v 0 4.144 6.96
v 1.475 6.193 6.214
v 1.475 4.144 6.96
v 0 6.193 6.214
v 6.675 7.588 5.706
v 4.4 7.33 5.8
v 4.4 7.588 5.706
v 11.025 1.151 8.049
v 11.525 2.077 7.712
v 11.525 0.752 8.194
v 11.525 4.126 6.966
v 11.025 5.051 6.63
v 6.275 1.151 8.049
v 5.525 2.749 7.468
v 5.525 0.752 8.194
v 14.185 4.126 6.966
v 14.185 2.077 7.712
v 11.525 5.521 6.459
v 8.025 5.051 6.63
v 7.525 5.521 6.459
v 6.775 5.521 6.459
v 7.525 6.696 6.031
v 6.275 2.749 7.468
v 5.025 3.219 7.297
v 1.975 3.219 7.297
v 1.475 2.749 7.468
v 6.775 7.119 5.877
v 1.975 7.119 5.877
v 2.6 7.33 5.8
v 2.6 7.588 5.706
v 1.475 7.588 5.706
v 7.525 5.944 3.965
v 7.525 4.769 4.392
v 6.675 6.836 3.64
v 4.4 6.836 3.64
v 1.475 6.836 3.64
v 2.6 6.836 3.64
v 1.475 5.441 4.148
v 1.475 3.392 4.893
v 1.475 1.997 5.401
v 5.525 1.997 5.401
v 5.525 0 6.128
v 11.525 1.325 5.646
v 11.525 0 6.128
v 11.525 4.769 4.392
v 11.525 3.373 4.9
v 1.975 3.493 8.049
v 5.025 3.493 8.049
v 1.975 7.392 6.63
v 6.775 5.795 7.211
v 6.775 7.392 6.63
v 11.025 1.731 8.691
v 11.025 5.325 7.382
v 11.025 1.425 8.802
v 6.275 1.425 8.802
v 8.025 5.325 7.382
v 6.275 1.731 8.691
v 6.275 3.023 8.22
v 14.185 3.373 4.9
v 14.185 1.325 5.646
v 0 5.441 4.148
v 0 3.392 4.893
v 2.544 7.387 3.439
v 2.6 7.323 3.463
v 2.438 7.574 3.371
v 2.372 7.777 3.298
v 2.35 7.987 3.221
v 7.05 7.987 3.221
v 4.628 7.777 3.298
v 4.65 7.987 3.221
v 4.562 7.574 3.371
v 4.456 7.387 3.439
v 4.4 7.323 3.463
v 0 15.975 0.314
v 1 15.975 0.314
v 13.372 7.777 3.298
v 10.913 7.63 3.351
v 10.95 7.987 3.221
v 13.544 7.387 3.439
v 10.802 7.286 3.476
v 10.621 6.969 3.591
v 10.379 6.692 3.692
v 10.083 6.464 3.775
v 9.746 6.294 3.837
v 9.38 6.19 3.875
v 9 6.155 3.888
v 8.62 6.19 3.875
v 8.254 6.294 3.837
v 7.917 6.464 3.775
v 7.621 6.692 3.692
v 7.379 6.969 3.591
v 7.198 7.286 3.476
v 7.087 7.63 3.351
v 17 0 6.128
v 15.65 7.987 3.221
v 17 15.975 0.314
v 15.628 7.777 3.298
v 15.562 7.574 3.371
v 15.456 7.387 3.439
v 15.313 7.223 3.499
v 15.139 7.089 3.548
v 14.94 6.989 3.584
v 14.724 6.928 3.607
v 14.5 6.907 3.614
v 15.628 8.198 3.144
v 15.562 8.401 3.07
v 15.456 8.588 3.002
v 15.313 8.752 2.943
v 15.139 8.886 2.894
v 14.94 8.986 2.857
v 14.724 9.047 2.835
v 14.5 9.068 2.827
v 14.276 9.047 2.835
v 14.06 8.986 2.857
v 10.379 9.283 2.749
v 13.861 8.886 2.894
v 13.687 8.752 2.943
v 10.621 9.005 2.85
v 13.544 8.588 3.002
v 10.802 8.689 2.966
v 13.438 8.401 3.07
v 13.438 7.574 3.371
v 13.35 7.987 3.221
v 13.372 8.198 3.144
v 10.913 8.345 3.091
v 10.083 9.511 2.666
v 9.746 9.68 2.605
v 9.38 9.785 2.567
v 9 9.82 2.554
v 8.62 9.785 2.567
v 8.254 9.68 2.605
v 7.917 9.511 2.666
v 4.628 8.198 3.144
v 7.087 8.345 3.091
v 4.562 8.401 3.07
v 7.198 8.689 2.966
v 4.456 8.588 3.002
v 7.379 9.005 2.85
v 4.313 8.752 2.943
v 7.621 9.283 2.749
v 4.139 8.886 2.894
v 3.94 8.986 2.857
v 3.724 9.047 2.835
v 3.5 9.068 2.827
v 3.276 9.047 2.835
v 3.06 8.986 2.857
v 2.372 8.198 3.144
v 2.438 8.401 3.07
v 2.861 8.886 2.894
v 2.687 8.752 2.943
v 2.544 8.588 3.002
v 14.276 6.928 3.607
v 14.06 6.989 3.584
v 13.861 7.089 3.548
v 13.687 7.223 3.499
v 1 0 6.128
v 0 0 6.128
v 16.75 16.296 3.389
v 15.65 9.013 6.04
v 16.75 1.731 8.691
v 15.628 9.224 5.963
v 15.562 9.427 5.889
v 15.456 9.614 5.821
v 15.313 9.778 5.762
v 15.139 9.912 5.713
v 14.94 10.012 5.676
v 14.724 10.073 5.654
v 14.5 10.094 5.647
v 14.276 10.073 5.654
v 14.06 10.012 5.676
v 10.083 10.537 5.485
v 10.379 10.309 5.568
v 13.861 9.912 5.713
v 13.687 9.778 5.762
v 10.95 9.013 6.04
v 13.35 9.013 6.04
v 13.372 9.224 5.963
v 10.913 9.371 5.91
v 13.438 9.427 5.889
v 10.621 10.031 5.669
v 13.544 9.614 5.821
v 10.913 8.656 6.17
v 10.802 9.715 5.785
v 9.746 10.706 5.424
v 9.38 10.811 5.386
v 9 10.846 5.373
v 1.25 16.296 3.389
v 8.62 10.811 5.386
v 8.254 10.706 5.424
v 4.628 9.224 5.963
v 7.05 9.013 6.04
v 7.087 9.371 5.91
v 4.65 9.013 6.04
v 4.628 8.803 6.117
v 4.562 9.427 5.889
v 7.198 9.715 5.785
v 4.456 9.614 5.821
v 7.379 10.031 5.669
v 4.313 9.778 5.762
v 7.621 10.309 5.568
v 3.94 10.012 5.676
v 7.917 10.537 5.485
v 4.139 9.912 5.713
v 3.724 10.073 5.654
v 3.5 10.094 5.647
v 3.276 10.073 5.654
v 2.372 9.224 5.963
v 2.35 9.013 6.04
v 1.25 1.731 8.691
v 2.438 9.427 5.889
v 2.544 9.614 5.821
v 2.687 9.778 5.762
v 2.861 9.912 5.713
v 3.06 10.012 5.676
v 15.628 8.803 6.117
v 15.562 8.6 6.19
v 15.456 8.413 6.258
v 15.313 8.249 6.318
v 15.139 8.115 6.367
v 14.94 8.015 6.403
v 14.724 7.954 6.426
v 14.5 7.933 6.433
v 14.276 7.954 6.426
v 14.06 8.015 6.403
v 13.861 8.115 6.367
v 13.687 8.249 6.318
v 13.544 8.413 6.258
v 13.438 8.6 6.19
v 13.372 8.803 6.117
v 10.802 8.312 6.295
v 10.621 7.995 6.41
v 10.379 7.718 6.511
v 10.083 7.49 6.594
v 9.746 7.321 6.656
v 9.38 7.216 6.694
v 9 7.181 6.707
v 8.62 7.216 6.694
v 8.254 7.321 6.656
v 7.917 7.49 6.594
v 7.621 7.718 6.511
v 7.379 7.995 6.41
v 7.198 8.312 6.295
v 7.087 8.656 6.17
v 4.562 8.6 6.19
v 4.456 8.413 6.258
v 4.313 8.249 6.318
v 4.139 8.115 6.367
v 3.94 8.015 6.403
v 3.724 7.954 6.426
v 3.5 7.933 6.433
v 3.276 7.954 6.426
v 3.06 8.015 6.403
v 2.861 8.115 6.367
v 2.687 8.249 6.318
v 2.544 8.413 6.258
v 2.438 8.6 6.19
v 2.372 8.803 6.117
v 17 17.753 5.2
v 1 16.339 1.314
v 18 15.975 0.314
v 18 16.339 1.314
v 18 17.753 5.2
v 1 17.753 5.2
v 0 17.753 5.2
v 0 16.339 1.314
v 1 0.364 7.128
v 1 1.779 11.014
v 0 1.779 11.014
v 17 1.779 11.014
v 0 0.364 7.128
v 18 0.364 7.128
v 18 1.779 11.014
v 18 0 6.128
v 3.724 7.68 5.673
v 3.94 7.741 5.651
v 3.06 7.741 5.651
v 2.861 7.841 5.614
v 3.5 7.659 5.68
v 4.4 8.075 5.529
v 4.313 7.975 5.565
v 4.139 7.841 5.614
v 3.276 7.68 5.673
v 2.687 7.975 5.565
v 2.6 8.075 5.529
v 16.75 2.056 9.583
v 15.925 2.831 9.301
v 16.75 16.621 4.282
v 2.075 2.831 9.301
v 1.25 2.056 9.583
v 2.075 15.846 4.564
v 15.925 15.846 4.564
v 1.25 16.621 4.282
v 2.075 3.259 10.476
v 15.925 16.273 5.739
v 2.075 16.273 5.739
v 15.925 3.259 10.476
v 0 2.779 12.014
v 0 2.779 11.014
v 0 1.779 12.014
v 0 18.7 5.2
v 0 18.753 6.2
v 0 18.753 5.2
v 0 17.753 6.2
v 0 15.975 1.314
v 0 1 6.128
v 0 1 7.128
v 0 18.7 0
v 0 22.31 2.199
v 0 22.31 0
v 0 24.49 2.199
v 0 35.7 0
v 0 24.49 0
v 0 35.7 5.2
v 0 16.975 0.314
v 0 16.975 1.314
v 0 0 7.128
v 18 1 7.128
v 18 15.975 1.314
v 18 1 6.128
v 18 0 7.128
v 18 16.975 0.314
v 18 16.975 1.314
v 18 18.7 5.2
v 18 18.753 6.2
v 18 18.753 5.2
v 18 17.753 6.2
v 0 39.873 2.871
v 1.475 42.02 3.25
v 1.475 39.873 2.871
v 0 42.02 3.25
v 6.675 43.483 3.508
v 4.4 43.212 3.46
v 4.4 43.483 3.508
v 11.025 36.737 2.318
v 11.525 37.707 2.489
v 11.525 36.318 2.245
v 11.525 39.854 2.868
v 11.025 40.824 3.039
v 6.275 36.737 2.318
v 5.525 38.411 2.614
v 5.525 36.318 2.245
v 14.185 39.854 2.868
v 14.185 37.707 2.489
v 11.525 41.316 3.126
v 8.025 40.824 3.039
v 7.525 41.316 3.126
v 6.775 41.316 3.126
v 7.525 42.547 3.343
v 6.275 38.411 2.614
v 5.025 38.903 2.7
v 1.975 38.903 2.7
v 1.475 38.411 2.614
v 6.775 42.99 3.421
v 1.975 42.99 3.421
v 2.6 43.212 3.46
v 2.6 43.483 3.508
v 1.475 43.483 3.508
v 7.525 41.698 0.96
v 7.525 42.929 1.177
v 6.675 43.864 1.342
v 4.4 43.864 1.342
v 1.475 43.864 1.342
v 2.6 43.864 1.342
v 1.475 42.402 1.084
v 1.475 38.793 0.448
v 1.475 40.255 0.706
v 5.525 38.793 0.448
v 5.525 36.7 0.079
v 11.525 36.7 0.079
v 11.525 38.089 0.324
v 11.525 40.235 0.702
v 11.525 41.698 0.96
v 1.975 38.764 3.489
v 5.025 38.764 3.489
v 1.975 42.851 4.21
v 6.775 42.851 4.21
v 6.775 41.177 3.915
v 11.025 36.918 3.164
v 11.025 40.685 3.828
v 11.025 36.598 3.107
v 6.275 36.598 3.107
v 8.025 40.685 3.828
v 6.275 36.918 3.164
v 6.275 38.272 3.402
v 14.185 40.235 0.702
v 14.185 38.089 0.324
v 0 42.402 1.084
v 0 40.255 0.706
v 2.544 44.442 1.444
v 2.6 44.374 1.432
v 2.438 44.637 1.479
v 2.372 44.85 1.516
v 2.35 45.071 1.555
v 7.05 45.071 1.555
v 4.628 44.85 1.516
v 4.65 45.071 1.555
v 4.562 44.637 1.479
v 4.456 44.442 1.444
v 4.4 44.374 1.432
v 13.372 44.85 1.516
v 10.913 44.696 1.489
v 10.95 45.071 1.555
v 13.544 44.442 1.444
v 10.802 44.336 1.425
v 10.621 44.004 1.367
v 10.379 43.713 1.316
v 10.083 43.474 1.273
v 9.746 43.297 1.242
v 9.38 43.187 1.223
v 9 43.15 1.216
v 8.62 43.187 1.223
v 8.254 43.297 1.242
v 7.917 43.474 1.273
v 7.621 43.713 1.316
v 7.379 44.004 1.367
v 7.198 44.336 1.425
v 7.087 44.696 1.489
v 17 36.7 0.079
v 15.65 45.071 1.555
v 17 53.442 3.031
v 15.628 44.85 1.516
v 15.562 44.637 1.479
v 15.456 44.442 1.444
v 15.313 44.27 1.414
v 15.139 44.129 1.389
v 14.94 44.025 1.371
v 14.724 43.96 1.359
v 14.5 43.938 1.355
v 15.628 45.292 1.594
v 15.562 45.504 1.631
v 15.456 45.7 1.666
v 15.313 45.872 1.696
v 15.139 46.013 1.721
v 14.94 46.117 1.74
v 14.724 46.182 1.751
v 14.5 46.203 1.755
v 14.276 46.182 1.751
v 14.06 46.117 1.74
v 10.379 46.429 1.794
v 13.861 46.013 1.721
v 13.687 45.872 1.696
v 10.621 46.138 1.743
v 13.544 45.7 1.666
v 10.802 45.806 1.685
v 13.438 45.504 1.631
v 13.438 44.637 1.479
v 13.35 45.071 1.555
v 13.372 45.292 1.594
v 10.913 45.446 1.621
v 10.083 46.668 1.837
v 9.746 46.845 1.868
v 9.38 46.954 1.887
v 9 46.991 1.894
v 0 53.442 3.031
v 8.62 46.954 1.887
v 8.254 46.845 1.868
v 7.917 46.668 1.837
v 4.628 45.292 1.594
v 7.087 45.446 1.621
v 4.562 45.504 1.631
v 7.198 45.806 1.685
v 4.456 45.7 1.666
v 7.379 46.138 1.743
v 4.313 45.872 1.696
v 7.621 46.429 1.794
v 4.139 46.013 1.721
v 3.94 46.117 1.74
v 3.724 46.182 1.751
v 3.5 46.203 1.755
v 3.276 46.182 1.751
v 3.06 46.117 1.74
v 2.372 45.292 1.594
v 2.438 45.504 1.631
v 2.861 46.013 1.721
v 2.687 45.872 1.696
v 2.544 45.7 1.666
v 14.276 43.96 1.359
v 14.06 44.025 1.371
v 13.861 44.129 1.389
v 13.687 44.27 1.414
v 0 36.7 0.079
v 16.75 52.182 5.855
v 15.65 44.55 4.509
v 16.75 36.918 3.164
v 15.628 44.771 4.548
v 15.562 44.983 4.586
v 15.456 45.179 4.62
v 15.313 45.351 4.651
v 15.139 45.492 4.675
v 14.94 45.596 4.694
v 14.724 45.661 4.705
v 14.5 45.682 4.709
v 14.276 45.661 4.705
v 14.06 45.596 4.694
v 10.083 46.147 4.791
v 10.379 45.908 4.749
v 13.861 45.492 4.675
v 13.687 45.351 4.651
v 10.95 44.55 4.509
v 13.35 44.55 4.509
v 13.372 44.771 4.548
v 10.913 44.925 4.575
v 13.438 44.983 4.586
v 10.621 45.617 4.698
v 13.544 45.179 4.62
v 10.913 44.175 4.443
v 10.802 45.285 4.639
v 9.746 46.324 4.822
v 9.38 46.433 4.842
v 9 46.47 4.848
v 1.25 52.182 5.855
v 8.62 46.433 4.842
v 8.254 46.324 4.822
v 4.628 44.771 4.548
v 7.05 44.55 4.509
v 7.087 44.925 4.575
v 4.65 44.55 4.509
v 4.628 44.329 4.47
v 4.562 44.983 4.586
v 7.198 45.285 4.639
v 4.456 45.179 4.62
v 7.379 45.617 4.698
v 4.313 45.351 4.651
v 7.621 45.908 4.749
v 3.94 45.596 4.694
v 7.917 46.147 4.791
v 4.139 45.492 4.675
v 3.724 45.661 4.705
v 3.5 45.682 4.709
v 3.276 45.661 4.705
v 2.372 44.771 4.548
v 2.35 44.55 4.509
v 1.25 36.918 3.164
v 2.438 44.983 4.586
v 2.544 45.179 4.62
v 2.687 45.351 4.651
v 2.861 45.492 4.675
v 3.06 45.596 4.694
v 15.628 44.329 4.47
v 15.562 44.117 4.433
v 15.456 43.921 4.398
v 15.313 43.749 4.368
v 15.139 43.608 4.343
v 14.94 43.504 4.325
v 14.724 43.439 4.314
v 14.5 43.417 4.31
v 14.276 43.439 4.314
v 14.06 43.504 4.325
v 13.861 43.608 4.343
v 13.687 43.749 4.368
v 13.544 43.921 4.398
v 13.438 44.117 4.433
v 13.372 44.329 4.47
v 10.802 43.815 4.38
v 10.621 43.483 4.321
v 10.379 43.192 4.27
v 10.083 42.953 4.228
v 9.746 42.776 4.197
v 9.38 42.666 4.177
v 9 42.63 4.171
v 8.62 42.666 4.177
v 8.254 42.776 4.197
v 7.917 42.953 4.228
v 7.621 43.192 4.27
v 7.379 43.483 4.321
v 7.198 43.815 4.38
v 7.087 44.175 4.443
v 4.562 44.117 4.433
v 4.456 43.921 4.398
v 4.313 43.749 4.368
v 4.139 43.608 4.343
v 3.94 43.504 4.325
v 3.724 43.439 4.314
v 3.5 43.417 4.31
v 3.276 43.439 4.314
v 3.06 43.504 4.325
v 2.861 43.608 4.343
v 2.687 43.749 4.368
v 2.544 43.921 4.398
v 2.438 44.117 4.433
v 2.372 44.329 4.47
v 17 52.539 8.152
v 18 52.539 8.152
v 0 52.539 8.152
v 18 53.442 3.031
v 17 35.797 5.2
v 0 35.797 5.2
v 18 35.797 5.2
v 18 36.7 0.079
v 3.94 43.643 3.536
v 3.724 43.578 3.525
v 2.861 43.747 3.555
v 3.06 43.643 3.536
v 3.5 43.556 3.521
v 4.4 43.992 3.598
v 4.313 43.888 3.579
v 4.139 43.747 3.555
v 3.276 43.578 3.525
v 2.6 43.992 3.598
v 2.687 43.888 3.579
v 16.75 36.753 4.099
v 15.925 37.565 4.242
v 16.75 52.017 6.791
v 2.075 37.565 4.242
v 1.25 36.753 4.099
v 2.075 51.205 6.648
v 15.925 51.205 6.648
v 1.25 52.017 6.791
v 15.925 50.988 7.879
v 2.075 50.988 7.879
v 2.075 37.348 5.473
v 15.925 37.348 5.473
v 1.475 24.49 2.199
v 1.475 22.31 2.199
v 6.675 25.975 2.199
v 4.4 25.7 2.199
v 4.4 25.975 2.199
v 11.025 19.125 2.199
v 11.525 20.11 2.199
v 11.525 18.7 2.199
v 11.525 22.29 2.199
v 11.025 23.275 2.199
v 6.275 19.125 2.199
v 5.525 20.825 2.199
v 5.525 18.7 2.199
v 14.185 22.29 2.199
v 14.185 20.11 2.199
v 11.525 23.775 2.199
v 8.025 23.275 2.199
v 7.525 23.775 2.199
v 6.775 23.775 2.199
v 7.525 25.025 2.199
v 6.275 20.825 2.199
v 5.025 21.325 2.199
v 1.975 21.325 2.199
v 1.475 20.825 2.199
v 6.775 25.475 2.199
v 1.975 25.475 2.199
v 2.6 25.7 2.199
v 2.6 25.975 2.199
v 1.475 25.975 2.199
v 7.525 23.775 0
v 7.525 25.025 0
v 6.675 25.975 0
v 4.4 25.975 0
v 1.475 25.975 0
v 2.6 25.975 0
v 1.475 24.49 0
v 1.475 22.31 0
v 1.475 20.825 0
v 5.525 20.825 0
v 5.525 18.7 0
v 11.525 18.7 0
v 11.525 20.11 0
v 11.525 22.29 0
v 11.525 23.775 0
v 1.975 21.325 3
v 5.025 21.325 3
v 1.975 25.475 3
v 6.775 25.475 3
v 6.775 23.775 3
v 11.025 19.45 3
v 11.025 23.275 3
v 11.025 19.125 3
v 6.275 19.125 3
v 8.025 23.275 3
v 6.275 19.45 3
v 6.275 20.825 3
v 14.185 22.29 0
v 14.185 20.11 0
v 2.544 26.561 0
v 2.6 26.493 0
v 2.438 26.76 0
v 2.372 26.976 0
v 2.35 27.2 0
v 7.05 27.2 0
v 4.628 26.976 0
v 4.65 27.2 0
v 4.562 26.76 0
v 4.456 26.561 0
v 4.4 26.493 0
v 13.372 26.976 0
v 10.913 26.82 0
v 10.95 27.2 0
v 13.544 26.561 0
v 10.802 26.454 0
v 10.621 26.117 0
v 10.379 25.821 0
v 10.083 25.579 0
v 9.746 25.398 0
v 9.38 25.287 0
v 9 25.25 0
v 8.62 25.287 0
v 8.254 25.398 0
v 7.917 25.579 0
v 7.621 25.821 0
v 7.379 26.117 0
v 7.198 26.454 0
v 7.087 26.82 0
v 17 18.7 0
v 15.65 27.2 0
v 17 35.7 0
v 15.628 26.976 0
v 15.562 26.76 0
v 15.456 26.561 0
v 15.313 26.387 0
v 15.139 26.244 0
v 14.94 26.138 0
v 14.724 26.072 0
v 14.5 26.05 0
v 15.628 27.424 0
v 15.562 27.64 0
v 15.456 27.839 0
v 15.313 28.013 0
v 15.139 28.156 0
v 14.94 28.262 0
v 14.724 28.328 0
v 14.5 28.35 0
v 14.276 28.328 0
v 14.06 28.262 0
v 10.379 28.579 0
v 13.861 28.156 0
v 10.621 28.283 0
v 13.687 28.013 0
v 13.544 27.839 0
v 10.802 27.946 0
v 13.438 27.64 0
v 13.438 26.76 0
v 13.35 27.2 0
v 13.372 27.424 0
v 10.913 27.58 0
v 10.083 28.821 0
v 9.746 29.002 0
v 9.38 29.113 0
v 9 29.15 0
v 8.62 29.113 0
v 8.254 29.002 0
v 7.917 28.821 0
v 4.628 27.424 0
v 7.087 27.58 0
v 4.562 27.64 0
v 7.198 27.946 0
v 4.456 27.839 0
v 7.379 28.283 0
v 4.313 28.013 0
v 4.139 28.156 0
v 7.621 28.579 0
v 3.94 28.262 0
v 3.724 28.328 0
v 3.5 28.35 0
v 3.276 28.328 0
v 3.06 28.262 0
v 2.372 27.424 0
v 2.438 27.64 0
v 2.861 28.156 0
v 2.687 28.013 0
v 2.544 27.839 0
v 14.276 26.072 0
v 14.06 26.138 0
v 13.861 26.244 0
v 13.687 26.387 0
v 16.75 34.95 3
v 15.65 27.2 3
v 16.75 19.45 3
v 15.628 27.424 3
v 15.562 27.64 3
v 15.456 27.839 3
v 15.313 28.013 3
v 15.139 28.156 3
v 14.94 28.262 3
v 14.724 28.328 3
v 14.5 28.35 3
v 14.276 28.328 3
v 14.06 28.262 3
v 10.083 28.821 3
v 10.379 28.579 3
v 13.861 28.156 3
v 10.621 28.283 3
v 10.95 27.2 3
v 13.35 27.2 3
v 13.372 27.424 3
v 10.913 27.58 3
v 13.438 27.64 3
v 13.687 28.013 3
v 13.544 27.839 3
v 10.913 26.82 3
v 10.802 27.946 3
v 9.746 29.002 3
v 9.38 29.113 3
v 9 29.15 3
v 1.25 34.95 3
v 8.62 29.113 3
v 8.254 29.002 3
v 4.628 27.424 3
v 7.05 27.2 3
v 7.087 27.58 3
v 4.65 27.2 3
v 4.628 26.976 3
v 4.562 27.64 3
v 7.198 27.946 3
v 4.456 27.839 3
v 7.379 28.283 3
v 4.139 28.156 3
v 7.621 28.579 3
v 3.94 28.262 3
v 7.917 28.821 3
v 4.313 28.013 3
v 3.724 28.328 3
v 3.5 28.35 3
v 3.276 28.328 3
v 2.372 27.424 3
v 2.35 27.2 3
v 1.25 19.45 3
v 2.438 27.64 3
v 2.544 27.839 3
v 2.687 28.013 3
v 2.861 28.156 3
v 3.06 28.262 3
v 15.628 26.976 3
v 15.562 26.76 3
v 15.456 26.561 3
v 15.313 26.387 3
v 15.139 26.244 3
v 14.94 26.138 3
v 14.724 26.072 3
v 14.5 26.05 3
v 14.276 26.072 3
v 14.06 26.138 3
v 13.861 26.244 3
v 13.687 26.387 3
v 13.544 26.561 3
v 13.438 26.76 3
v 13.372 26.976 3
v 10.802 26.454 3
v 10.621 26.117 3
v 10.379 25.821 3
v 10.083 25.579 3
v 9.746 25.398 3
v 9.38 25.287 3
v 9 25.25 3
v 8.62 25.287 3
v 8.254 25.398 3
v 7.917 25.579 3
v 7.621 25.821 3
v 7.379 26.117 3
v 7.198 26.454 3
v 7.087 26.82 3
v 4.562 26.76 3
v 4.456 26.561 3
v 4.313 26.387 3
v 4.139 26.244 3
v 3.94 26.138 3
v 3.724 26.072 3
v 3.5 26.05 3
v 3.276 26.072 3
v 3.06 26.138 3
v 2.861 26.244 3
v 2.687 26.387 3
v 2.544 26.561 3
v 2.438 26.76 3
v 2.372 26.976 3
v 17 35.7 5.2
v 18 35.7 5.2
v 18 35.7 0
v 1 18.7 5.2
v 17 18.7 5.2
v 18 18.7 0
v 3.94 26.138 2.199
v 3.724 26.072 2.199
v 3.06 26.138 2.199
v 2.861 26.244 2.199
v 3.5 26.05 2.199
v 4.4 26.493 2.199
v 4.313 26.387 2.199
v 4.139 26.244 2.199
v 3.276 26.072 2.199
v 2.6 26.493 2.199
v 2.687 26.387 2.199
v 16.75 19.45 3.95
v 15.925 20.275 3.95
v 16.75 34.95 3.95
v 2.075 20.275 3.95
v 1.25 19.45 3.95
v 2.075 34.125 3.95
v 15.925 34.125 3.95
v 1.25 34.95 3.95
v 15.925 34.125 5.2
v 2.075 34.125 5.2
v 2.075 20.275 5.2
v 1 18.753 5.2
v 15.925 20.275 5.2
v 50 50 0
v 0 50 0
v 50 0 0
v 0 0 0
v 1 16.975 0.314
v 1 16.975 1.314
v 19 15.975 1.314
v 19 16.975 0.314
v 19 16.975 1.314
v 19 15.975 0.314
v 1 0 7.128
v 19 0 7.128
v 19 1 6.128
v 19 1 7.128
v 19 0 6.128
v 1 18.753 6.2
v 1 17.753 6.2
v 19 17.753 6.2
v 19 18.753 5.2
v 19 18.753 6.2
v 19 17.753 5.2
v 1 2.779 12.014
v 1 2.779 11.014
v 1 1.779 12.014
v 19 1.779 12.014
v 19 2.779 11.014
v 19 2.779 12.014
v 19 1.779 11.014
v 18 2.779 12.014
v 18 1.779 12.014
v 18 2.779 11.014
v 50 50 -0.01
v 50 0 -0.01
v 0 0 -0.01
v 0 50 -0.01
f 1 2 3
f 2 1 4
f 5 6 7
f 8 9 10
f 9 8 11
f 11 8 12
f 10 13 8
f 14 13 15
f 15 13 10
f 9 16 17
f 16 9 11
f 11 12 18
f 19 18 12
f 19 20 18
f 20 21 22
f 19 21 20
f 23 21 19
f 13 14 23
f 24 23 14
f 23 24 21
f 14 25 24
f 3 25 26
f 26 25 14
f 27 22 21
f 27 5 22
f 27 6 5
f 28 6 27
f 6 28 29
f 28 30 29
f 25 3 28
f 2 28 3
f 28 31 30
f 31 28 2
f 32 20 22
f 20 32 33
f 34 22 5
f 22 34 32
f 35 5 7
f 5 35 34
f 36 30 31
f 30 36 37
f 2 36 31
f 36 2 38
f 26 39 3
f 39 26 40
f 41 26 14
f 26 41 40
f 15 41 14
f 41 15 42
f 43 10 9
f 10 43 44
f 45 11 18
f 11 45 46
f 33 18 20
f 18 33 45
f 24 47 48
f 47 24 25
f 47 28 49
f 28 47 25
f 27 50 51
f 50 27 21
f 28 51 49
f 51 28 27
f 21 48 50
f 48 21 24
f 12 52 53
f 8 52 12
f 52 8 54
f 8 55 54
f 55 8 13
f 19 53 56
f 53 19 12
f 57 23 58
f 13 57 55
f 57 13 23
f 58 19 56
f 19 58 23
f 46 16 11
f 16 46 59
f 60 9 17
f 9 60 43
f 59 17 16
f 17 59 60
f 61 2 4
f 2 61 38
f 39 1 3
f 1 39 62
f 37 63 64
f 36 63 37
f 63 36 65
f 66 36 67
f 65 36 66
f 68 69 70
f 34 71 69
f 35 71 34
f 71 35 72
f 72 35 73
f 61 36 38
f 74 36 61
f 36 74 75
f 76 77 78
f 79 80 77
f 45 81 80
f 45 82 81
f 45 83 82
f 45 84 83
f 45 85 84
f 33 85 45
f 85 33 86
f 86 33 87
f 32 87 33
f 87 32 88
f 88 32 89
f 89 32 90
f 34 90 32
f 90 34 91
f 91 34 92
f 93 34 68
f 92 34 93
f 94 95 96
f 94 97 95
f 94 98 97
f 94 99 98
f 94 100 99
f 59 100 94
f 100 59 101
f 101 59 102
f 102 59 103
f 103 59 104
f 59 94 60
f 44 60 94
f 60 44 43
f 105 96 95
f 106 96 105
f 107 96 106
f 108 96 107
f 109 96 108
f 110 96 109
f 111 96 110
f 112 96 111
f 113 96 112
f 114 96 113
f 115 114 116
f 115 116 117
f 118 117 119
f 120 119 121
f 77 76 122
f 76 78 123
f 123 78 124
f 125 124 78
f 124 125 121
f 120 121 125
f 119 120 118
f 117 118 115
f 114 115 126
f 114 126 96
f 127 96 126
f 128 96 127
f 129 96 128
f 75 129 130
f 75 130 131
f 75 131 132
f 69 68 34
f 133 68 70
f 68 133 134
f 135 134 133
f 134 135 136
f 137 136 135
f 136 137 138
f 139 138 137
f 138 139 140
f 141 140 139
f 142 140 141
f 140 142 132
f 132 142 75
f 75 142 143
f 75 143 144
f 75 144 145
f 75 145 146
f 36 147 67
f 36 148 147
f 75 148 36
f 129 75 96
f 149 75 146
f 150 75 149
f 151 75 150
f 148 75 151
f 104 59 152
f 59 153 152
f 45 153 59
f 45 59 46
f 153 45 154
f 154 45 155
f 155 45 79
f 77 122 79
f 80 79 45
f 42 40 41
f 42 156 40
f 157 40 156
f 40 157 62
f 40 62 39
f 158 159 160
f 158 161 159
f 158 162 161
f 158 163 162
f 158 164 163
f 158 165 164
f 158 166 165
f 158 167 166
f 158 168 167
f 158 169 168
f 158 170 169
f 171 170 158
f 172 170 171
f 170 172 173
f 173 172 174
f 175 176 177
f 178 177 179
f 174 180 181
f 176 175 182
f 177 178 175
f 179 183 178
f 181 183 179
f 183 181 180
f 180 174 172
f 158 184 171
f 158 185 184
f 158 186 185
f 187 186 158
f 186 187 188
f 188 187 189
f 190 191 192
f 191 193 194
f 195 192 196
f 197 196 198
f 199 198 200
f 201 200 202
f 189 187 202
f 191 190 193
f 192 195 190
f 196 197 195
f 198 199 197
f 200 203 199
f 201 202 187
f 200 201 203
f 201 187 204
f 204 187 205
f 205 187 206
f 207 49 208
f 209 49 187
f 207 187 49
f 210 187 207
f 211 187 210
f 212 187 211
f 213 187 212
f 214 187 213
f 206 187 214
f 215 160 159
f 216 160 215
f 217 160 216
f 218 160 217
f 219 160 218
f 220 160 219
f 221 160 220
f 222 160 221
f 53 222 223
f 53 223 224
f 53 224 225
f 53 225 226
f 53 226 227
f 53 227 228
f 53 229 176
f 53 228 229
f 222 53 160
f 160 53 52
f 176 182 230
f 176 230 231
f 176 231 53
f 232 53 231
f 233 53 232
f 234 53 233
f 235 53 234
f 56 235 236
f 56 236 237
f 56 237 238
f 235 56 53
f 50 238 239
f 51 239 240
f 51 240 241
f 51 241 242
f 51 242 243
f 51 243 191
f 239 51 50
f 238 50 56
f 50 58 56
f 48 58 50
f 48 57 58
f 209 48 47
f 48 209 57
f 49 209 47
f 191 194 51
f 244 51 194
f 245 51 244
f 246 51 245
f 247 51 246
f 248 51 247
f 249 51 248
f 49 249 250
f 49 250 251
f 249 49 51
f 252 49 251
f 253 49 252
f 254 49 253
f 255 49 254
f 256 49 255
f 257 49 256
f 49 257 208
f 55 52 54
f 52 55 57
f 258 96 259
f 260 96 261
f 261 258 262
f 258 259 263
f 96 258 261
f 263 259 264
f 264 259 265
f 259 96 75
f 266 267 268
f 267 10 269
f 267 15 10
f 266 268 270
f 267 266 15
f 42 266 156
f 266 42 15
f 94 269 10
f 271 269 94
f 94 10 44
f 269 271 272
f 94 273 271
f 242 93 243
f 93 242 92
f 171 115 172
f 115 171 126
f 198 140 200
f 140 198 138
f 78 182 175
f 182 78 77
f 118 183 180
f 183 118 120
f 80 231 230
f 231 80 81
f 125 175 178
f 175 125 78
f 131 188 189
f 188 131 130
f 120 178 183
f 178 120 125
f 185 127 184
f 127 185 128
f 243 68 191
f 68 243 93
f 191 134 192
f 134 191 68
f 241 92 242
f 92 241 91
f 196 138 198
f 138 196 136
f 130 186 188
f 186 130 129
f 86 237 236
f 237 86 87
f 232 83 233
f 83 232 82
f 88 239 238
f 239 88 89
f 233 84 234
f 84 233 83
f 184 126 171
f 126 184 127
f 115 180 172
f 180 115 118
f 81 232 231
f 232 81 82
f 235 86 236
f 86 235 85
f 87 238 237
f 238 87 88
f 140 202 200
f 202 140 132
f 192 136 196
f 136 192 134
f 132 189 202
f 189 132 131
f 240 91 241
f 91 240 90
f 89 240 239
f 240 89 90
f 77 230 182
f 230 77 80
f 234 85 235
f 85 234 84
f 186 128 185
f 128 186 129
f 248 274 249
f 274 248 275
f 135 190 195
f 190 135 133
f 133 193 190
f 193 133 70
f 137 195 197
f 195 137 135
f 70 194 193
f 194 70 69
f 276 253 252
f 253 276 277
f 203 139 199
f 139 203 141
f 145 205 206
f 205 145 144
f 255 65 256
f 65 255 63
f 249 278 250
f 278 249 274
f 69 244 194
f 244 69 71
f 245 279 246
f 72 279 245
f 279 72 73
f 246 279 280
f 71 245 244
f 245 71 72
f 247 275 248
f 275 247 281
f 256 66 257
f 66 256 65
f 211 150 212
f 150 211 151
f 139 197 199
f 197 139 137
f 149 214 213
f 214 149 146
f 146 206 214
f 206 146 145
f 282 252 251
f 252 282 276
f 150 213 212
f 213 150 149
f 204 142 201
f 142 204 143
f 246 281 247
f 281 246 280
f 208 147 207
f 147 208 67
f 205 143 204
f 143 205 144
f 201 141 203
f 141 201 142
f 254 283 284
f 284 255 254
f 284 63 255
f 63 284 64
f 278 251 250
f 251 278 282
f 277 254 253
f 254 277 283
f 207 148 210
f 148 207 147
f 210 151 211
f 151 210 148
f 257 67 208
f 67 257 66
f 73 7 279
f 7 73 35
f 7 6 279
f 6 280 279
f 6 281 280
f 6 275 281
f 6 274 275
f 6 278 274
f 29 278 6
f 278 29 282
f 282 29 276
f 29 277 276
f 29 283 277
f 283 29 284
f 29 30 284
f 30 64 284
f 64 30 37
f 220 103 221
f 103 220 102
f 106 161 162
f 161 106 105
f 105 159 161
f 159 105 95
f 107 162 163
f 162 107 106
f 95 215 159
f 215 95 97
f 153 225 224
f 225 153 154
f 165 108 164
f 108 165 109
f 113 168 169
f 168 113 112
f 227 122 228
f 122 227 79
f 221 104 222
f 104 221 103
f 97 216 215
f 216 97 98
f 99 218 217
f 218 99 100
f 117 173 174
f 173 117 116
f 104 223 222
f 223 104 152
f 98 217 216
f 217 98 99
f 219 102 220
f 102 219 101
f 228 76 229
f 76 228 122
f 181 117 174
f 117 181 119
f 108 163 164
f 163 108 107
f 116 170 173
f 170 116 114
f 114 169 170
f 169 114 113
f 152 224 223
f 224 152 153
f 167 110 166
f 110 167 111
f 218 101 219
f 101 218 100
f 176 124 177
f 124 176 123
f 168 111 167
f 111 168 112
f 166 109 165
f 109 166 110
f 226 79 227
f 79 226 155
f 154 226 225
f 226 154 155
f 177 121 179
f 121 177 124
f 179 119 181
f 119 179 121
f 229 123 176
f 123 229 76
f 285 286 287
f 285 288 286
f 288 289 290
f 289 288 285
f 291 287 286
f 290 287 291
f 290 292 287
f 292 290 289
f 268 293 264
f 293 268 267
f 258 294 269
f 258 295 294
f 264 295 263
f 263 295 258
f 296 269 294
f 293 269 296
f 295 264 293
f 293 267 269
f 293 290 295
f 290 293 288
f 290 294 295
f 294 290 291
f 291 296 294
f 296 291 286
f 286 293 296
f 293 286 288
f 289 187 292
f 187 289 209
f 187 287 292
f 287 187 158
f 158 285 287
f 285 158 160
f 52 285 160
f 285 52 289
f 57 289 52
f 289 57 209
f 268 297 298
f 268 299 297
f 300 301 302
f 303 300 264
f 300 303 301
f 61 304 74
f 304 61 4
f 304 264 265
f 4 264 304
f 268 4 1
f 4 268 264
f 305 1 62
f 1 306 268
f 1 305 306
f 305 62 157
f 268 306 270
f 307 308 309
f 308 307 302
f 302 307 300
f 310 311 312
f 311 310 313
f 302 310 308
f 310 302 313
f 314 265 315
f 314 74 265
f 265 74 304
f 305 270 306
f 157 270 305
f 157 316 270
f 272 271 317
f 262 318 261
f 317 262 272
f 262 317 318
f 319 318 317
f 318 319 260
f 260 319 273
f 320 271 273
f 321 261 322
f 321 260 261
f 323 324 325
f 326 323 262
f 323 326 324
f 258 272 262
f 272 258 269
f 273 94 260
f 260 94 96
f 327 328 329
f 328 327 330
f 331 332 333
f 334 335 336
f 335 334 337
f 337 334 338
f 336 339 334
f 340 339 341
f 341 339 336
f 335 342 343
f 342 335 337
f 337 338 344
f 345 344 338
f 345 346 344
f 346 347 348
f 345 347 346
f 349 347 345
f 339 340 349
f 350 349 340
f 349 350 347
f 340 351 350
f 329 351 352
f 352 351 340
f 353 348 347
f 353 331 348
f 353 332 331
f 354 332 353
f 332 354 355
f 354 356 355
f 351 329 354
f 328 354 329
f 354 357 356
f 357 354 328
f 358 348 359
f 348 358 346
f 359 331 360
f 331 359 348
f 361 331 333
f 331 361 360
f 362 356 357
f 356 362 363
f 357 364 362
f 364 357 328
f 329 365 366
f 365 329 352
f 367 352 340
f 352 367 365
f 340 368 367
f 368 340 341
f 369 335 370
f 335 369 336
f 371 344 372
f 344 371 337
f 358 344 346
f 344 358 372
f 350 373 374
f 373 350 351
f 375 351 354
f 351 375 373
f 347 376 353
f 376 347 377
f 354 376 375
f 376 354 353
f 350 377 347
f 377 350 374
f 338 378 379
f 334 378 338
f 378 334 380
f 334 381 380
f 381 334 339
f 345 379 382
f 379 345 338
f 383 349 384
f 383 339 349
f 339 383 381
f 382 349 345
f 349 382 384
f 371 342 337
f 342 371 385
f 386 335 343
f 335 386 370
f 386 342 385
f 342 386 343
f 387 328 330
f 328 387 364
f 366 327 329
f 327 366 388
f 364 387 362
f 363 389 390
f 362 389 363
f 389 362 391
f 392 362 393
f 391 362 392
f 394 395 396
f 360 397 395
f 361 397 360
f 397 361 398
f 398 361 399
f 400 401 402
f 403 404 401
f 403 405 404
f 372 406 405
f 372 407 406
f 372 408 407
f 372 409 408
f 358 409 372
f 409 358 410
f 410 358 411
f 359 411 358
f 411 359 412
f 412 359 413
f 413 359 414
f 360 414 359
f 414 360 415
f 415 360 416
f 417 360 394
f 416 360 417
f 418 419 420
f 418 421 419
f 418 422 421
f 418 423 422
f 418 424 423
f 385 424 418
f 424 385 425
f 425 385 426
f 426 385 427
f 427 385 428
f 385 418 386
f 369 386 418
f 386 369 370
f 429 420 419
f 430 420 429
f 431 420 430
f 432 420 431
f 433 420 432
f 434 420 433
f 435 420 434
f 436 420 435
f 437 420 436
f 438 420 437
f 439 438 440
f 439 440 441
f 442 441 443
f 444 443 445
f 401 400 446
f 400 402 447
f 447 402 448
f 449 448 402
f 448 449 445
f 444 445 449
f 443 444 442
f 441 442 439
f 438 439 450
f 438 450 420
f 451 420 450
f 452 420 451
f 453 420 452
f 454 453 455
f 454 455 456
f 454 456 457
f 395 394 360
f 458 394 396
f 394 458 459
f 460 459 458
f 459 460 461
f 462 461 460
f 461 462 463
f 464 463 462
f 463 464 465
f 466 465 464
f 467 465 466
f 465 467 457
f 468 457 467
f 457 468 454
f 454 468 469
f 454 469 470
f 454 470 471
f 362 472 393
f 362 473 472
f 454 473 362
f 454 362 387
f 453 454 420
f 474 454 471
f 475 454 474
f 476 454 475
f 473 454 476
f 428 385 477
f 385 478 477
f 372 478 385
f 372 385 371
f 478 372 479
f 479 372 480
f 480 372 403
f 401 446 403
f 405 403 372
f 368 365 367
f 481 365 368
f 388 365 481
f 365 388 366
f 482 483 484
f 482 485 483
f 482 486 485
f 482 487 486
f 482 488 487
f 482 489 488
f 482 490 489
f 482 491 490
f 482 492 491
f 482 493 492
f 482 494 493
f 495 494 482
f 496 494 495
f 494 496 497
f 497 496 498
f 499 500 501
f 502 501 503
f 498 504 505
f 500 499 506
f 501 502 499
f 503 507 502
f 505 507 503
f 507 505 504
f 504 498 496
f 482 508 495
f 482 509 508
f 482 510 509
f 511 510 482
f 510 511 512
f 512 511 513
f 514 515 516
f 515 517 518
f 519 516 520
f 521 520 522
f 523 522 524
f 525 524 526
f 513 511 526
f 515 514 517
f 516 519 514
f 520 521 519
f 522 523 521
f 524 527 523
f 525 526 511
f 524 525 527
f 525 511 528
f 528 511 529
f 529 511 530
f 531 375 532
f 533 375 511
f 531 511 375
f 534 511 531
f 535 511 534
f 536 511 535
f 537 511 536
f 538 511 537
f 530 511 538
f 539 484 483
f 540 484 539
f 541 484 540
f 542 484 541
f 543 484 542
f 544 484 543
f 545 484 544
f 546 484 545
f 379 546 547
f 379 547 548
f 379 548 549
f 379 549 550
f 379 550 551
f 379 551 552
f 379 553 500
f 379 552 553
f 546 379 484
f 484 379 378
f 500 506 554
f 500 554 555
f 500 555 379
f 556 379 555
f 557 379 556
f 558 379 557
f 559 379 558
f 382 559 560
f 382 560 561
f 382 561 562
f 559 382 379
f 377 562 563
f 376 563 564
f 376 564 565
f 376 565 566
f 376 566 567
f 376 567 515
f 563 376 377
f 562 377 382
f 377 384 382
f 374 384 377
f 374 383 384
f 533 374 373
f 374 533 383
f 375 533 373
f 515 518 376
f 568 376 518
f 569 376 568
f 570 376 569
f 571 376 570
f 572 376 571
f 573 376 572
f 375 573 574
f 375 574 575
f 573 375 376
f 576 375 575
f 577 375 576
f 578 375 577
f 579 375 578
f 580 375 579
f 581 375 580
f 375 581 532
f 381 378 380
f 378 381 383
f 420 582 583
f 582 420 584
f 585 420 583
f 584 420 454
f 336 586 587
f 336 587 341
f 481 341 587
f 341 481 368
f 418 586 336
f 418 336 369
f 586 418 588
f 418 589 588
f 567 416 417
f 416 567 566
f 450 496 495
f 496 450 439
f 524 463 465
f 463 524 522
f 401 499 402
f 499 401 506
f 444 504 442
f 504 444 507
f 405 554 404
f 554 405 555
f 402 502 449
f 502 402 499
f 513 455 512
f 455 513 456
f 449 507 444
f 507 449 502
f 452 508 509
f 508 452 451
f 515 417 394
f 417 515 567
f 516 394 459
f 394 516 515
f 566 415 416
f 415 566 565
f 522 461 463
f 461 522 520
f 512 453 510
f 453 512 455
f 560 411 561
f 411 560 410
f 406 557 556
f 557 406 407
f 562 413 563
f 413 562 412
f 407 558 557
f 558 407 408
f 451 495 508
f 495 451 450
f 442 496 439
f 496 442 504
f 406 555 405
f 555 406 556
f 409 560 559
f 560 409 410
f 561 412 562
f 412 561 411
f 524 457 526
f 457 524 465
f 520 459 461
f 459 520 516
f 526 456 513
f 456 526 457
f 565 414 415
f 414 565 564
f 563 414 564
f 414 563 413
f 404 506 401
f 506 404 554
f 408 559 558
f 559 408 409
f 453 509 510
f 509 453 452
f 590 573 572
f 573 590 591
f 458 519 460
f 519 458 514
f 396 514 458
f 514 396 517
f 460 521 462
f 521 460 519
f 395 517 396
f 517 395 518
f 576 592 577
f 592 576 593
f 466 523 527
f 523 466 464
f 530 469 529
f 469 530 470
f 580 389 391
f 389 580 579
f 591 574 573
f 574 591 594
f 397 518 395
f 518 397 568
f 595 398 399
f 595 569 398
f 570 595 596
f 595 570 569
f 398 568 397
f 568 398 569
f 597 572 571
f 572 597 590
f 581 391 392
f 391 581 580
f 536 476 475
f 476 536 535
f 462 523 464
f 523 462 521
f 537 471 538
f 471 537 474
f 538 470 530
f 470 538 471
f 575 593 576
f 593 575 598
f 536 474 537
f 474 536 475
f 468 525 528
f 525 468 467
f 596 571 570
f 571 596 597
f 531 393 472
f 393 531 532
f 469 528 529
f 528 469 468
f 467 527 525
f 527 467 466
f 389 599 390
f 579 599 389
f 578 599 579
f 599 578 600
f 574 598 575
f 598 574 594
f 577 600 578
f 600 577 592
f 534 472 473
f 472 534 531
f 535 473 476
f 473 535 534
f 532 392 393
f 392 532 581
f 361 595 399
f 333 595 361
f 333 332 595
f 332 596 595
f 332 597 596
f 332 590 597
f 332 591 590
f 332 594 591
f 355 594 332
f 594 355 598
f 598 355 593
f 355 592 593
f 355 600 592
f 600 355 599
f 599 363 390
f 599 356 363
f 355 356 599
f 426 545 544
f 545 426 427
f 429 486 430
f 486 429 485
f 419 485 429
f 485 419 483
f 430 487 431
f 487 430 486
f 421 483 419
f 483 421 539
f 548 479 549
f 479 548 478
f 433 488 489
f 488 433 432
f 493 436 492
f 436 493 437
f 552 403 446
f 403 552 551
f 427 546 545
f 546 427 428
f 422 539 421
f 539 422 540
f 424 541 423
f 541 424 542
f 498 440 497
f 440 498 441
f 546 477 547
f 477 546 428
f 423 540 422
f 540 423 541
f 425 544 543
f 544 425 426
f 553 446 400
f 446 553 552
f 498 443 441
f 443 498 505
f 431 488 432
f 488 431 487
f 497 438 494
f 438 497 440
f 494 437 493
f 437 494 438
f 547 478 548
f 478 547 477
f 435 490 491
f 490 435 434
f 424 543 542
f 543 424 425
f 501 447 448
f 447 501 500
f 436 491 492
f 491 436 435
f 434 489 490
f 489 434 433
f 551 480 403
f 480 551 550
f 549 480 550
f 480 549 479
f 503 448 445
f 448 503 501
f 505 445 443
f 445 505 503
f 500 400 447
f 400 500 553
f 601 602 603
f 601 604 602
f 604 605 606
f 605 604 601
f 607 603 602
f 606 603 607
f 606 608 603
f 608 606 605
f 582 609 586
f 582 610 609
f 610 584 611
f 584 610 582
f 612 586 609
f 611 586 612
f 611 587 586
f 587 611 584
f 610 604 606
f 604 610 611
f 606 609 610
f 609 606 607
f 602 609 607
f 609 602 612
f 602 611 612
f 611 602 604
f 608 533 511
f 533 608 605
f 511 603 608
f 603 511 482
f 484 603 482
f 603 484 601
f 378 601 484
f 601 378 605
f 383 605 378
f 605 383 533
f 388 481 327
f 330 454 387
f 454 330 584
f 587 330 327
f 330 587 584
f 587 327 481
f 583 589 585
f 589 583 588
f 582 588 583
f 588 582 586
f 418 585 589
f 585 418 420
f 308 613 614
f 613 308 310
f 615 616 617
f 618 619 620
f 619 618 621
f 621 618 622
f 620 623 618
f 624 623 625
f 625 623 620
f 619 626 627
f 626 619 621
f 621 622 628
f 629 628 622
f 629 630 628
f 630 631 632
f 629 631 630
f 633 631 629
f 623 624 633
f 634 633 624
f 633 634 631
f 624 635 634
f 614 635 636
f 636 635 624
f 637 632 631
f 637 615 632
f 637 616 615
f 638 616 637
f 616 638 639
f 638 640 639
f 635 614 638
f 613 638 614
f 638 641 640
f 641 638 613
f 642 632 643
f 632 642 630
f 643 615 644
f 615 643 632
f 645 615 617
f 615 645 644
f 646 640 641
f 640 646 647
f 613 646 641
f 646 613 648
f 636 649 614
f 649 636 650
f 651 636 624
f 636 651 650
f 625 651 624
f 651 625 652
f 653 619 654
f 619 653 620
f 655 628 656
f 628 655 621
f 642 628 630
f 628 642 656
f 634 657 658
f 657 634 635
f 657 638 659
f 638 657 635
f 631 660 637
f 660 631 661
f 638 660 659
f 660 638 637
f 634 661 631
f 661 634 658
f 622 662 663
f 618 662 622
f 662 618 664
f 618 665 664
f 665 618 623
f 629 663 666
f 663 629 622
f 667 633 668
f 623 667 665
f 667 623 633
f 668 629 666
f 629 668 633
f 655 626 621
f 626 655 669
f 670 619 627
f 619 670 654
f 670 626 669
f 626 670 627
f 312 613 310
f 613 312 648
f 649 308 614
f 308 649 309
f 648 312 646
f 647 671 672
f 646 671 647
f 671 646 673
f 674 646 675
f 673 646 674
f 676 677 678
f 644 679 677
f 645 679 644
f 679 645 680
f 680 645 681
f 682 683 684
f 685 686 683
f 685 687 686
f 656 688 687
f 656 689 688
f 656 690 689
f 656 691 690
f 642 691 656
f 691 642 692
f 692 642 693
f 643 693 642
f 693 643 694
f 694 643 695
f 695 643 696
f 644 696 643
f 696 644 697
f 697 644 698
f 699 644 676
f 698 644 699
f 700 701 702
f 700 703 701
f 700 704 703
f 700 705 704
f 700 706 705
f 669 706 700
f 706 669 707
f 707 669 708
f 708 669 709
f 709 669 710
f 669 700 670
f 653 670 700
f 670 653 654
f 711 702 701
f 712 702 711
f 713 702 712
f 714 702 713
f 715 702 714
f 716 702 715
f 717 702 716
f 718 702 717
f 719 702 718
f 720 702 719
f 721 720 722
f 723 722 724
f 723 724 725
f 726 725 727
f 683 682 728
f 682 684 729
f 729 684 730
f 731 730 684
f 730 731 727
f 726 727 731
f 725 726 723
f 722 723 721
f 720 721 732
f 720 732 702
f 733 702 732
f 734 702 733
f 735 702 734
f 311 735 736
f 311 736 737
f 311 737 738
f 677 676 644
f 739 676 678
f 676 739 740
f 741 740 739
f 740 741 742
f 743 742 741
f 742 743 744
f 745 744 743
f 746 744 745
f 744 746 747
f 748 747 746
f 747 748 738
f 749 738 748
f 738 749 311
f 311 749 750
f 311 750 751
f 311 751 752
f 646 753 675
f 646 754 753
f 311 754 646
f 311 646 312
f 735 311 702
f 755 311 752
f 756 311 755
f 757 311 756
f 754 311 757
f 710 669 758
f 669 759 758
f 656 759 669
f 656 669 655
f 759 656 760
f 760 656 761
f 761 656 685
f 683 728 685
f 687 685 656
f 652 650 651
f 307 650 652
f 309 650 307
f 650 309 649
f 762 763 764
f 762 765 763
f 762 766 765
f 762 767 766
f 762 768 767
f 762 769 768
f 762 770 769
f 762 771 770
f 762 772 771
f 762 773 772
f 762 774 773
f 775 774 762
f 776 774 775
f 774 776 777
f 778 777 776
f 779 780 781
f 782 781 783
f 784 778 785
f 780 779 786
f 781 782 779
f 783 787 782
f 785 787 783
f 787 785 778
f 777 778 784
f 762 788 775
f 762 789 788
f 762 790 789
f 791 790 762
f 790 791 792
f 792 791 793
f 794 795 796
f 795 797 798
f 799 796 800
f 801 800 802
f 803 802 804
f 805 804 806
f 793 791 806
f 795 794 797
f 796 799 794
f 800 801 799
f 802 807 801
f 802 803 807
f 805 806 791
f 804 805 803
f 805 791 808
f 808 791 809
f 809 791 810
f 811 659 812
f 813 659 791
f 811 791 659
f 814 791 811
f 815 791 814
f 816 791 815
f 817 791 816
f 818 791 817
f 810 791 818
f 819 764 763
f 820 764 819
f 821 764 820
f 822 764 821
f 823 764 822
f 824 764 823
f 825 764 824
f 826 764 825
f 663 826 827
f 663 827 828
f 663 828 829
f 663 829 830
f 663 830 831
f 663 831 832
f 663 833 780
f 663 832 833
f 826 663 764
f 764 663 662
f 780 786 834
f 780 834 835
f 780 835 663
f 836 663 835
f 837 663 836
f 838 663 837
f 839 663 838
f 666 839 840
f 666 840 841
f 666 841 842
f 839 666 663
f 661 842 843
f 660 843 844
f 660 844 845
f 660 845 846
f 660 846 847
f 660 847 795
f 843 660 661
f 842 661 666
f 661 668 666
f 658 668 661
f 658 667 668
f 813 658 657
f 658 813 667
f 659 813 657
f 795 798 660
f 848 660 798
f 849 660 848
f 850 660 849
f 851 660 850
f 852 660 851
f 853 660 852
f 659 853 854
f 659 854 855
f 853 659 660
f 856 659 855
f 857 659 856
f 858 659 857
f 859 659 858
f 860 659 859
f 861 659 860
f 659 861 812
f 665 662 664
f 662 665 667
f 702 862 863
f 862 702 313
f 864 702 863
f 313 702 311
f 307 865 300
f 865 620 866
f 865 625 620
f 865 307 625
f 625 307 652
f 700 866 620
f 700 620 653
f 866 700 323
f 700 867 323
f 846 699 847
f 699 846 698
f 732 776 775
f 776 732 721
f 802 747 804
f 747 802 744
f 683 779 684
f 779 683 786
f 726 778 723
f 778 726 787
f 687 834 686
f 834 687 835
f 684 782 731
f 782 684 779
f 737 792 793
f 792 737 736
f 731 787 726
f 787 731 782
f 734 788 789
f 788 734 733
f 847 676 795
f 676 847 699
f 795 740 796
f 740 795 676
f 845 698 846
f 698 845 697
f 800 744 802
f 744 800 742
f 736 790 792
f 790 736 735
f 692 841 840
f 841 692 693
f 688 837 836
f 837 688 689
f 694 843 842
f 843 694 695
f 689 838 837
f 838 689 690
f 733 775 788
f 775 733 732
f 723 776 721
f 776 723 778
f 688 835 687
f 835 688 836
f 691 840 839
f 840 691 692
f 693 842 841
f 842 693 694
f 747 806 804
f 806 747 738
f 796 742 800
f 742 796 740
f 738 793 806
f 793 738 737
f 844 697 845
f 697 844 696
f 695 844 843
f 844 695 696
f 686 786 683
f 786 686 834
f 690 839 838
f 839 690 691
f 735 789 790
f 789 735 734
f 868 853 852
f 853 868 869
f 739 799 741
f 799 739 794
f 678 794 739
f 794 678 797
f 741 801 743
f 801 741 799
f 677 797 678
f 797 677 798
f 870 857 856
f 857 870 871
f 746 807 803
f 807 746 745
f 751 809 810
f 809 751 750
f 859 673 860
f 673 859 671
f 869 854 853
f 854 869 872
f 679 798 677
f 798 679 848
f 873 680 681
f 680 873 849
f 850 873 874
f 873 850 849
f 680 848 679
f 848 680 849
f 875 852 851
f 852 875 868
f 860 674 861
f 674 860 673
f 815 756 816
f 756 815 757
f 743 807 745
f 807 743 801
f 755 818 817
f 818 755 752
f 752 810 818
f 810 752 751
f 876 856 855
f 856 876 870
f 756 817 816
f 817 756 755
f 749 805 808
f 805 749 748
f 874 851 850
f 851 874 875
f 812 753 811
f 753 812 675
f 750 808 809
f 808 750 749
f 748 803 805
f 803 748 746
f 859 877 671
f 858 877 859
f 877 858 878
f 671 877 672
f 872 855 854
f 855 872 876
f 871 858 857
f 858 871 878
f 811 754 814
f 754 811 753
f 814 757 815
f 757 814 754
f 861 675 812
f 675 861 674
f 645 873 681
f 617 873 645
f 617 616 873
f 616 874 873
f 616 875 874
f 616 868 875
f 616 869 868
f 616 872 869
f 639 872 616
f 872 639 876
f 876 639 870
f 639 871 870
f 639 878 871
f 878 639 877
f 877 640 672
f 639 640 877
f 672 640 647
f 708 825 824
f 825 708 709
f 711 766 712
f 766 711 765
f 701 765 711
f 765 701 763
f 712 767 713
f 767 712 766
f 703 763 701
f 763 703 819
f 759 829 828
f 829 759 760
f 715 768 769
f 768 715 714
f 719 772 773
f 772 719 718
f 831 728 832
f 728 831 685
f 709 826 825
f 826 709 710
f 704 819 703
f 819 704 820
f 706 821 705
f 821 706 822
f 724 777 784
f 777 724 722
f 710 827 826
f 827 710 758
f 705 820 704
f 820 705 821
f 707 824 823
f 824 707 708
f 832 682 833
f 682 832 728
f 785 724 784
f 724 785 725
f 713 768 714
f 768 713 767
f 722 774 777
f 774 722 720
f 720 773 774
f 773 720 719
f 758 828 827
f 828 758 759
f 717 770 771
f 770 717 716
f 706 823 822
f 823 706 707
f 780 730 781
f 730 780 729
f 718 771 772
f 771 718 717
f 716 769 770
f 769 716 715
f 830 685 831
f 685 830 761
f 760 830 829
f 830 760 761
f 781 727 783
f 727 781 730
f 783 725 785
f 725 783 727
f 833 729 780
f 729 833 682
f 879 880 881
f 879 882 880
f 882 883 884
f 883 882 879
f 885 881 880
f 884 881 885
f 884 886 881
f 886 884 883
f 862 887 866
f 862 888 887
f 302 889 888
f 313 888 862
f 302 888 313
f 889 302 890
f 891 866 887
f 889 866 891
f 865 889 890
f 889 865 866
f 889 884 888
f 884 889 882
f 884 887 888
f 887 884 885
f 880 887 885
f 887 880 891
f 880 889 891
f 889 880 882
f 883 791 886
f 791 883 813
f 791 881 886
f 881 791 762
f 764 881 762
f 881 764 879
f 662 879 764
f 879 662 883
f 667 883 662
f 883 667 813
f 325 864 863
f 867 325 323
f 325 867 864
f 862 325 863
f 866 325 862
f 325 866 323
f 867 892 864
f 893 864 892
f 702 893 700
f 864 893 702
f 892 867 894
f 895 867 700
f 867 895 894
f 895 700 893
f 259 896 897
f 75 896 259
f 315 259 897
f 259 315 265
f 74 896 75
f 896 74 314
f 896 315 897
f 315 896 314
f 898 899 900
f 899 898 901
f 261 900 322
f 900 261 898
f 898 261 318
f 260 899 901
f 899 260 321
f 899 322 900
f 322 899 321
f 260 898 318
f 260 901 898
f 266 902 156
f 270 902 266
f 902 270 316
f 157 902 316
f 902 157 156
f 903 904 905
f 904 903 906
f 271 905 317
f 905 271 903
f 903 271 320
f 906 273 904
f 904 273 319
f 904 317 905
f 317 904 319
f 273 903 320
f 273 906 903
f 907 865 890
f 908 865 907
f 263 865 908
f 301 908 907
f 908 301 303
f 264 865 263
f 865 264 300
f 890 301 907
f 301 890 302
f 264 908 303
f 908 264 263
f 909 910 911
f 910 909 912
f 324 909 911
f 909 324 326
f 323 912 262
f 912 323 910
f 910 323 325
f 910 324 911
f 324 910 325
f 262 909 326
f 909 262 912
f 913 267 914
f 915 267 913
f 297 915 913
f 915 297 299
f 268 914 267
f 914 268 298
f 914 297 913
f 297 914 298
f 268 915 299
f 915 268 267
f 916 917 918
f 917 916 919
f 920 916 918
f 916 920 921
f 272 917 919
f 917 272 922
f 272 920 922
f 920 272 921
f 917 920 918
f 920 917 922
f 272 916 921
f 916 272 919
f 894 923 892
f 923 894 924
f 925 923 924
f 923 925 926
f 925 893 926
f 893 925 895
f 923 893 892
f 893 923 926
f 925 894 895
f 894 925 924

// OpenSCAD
$fn = 32; // set the resolution of the model (Low during developmet for fast renders)

// ===================================IMPORTANT_NOTE======================================
// use use instaead of include such that the demo does not show in the file you call it in
// =======================================================================================

// local variables only used for demo of module and functions in this file
local_rotation_x = -20;
local_rotation_z = -0;
local_bottom_row = true;

// Naming explained:
// Slack means how much larger a part of the model is in comparison to the schematics
// so if you leave all slack it will be same dimensions as the schematics but most printers
// will make the holes smaller than the moddel and hence won't work so slack varaibles must
// be tested to ensure good fit before full print
//
// for hotswap width is the short side
// height is the long side with the connectors top and bottom
module key(
    plate_slack = 0.05,         // Slack for the top square hole
    plate_depth_slack = 0.05,   // slack for thickness of ledge for top square
    width_padding = 0.25,       // Slack for widht of hotswap cutout
    height_padding = 0.25,      // Slack for height of hotswap cutout
    exit_padding = 0.5,         // Slack for width of rectangle for hotswap metallic contact pad
    ledge_width = 0.5,          // How big the ledge is around the cutout to hold the hotswap
    center_radius_slack = 0.35, // Slack for center hole (big center pin of switch)
    sides_radius_slack = 0.25,  // Slack for side holes (smaller pins of switch)
    rotation_x =
        local_rotation_x, // rotation of the xy plane so normal 2D rotation around z-axis (e.g, for splay of columns)
    rotation_z =
        local_rotation_z, // rotation of the yz plane so normal 2D rotation around x-axis (e.g, for creating key wells)
)
{

    translate([ 0, 0, compute_translate_z(rotation_x, rotation_z) ])
        // color("pink") // Set to one to make it look like one (uncomment for development of module)
        rotate([ rotation_x, 0, rotation_z ])
            translate([ 0, 0, 0.9 + plate_depth_slack + 3 ]) // move the bottom to z == 0
        union()
    {
        // plate part
        color("red") linear_extrude(1.3 - plate_depth_slack) difference()
        {

            square([ 18, 17 ]);
            translate([ 2.1 + 1 - plate_slack / 2, 1.6 - plate_slack / 2 ]) square([
                13.8 + plate_slack, 13.8 + plate_slack
            ]); // the x axis should mby be 13.6 not sure as the drawing is contradicting
        }

        color("blue") translate([ 0, 0, -0.9 - plate_depth_slack ]) linear_extrude(0.9 + plate_depth_slack) difference()
        {
            square([ 18, 17 ]);
            translate([ 1.25 + 1, 0.75 ]) square([ 15.5, 15.5 ]);
        }

        // Hotswap part
        difference()
        {
            difference()
            {
                translate([ 0, 0, -3 - 0.9 - plate_depth_slack ]) color("green") linear_extrude(3) square([ 18, 17 ]);

                // translate is after roatate so we are moving the rightmost corner of the polygon from the origin (this
                // is withough padding so padding is extra)
                translate([ 11.275 + 1, 0.175, -3.001 - 0.9 - plate_depth_slack ]) rotate(90) union()
                {
                    linear_extrude(2.2, center = false)
                    {
                        polygon(points = [
                            [ 0 - width_padding, 0 - height_padding ], [ 4.65 + width_padding, 0 - height_padding ],
                            [ 4.65 + width_padding, 3.75 ], [ 5.9 + width_padding, 3.75 ],
                            [ 6.85 + width_padding, 4.6 ], [ 6.85 + width_padding, 9.55 + height_padding ],
                            [ 2.2 - width_padding, 9.55 + height_padding ], [ 2.2 - width_padding, 5.75 ],
                            [ 0 - width_padding, 5.75 ]
                        ]);
                    }

                    linear_extrude(4.2, center = false)
                    {
                        polygon(points = [
                            [ 4.65 + width_padding, 3.75 + ledge_width * 1.5 ],
                            [ 6.85 - ledge_width + width_padding, 3.75 + ledge_width * 1.5 ],
                            [ 6.85 - ledge_width + width_padding, 9.55 - ledge_width + height_padding ],
                            [ 2.2 + ledge_width - width_padding, 9.55 - ledge_width + height_padding ],
                            [ 2.2 + ledge_width - width_padding, 5.75 + ledge_width ]

                        ]);
                    }

                    linear_extrude(4.2, center = false)
                    {
                        polygon(points = [
                            [ 0 + ledge_width - width_padding, 0 + ledge_width - height_padding ],
                            [ 4.65 - ledge_width + width_padding, 0 + ledge_width - height_padding ],
                            [ 4.65 - ledge_width + width_padding, 3.75 - ledge_width ],
                            [ 2.2 - width_padding, 5.75 - ledge_width * 1.5 ],
                            [ 0 + ledge_width - width_padding, 5.75 - ledge_width * 1.5 ]

                        ]);
                    }

                    color("orange") translate([ 1.485 - exit_padding / 2, -2.66 - height_padding, 0 ])
                        cube([ 1.68 + exit_padding, 2.67, 2.2 ]);
                    color("pink") translate([ 3.685 - exit_padding / 2, 9.54 + height_padding, 0 ])
                        cube([ 1.68 + exit_padding, 2.67, 2.2 ]);
                }
            }

            // The 3 holes in a line on the midplate

            translate([ 9 + 1, 8.5, -3.001 - 0.9 - plate_depth_slack ]) cylinder(h = 10, r = 1.6 + center_radius_slack);
            color("indigo") translate([ 3.5 + 1, 8.5, -3.001 - 0.9 - plate_depth_slack ])
                cylinder(h = 10, r = 0.9 + sides_radius_slack);

            // A cube to subtract to make the print quality better as the hole is too close to the hotswap part
            color("red") translate([ 3.6, 7, -3.001 - 0.9 - plate_depth_slack ]) cube([ 1.8, 1, 2.2 ]);

            translate([ 14.5 + 1, 8.5, -3.001 - 0.9 - plate_depth_slack ])
                cylinder(h = 10, r = 0.9 + sides_radius_slack);
        }
    }
}

module centered_key(
    plate_slack = 0.05,         // Slack for the top square hole
    plate_depth_slack = 0.05,   // slack for thickness of ledge for top square
    width_padding = 0.25,       // Slack for widht of hotswap cutout
    height_padding = 0.25,      // Slack for height of hotswap cutout
    exit_padding = 0.5,         // Slack for width of rectangle for hotswap metallic contact pad
    ledge_width = 0.5,          // How big the ledge is around the cutout to hold the hotswap
    center_radius_slack = 0.35, // Slack for center hole (big center pin of switch)
    sides_radius_slack = 0.25,  // Slack for side holes (smaller pins of switch)
    rotation_x =
        local_rotation_x, // rotation of the xy plane so normal 2D rotation around z-axis (e.g, for splay of columns)
    rotation_z =
        local_rotation_z, // rotation of the yz plane so normal 2D rotation around x-axis (e.g, for creating key wells)
)
{

    // move the key up along z-axis so the bottom of the key is at z == 0
    // This is the translattion that bottom_row accounts for
    // translate_by = rotation_x < 0 ? vec_rotated_xz(0, 17, 5.2, rotation_x, rotation_z, false): [0, 0, 0];
    // echo("Translate by: ", translate_by);

    translate([ 0, 0, compute_translate_z(rotation_x, rotation_z) ]) rotate([ rotation_x, 0, rotation_z ])
        // color("orange")
        translate([ -1, 0, 0 ]) union()
    {
        difference()
        {
            key(plate_slack, plate_depth_slack, width_padding, height_padding, exit_padding, ledge_width,
                center_radius_slack, sides_radius_slack, 0, 0);

            translate([ -0.1, -0.1, -0.1 ]) cube([ 1.1, 20, 8.2 ]);

            // square([ 18, 17 ]);
        }
        translate([ 18, 0, 0 ]) cube([ 1, 17, 5.2 ]);
    }
}

centered_key();

translate([ 0, 18.7 + 18, 0 ]) centered_key(rotation_x = 10, rotation_z = 0);

translate([ 0, 18.7, 0 ]) centered_key(rotation_x = 0, rotation_z = 0);

// ====================================================================
//                          Helper functions
// ====================================================================

// compute the needed z-axis translation to move the top of the key to 5.2 which is thckness of the key
// the corner that is connected to the flat middle key is the one that decides which we compute by
// so top row computes by bottom top corners and bottom row computes by top top corners
function compute_translate_z(rotation_x, rotation_z) = rotation_x < 0
                                                           ? 5.2 - z_vec_rotated_xz(17, 5.2, rotation_x, rotation_z)
                                                           : // bottom row key
                                                           rotation_x > 0
                                                           ? 5.2 - z_vec_rotated_xz(0, 5.2, rotation_x, rotation_z)
                                                           :  // top row key
                                                           0; // middle key

// compute only the z-axis change for the rotation around x and z axis used in compute_translate_z
// so same as vec_rotated_xz but only for z-axis result is returned
function z_vec_rotated_xz(y, z, rotation_x, rotation_z) = y * sin(rotation_x) + z * cos(rotation_x);

// account_z_translate means that the key has been translated up along z-axis to make the connected corners z-axis = 5.2
// so to get correct point location that translation must be accounted for hence the flag
// need flag as it's used fro computation of compute_translate_z
function vec_rotated_xz(x, y, z, rotation_x, rotation_z) = [
    x * cos(rotation_z) - y * sin(rotation_z) * cos(rotation_x) + z * sin(rotation_z) * sin(rotation_x),
    x *sin(rotation_z) + y *cos(rotation_z) * cos(rotation_x) - z *cos(rotation_z) * sin(rotation_x),
    y *sin(rotation_x) + z *cos(rotation_x) + compute_translate_z(rotation_x, rotation_z)
];

// y*sin(rotation_x) + z*cos(rotation_x) + 5.2 - vec_rotated_xz(0, 17, 5.2, rotation_x, rotation_z, false)[2]
// ====================================================================
//                      Demo of helper functions
// ====================================================================

// top left back corner
color("Indigo") translate(vec_rotated_xz(0, 17, 0, local_rotation_x, local_rotation_z)) cube([ 1, 1, 1 ]);

// top right back corner
color("pink") translate(vec_rotated_xz(18, 17, 0, local_rotation_x, local_rotation_z)) cube([ 1, 1, 1 ]);

// bottom left back corner
color("teal") translate(vec_rotated_xz(0, 0, 0, local_rotation_x, local_rotation_z)) cube([ 1, 1, 1 ]);

// bottom right back corner
color("aquamarine") translate(vec_rotated_xz(18, 0, 0, local_rotation_x, local_rotation_z)) cube([ 1, 1, 1 ]);

// demo of front corners so facing user on switch side

// top left front corner
color("black") translate(vec_rotated_xz(0, 17, 5.2, local_rotation_x, local_rotation_z)) cube([ 1, 1, 1 ]);

// top right front corner
color("red") translate(vec_rotated_xz(18, 17, 5.2, local_rotation_x, local_rotation_z)) cube([ 1, 1, 1 ]);

// bottom left front corner
color("green") translate(vec_rotated_xz(0, 0, 5.2, local_rotation_x, local_rotation_z)) cube([ 1, 1, 1 ]);

// bottom right front corner
color("yellow") translate(vec_rotated_xz(18, 0, 5.2, local_rotation_x, local_rotation_z)) cube([ 1, 1, 1 ]);

// plane to illustrate bottom to ensure no points are in the negatie z-axis visually
color("lightgrey")
    // translate([-5, -5, 5.2])
    translate([ 0, 0, -0.01 ]) cube([ 50, 50, 0.01 ]);
